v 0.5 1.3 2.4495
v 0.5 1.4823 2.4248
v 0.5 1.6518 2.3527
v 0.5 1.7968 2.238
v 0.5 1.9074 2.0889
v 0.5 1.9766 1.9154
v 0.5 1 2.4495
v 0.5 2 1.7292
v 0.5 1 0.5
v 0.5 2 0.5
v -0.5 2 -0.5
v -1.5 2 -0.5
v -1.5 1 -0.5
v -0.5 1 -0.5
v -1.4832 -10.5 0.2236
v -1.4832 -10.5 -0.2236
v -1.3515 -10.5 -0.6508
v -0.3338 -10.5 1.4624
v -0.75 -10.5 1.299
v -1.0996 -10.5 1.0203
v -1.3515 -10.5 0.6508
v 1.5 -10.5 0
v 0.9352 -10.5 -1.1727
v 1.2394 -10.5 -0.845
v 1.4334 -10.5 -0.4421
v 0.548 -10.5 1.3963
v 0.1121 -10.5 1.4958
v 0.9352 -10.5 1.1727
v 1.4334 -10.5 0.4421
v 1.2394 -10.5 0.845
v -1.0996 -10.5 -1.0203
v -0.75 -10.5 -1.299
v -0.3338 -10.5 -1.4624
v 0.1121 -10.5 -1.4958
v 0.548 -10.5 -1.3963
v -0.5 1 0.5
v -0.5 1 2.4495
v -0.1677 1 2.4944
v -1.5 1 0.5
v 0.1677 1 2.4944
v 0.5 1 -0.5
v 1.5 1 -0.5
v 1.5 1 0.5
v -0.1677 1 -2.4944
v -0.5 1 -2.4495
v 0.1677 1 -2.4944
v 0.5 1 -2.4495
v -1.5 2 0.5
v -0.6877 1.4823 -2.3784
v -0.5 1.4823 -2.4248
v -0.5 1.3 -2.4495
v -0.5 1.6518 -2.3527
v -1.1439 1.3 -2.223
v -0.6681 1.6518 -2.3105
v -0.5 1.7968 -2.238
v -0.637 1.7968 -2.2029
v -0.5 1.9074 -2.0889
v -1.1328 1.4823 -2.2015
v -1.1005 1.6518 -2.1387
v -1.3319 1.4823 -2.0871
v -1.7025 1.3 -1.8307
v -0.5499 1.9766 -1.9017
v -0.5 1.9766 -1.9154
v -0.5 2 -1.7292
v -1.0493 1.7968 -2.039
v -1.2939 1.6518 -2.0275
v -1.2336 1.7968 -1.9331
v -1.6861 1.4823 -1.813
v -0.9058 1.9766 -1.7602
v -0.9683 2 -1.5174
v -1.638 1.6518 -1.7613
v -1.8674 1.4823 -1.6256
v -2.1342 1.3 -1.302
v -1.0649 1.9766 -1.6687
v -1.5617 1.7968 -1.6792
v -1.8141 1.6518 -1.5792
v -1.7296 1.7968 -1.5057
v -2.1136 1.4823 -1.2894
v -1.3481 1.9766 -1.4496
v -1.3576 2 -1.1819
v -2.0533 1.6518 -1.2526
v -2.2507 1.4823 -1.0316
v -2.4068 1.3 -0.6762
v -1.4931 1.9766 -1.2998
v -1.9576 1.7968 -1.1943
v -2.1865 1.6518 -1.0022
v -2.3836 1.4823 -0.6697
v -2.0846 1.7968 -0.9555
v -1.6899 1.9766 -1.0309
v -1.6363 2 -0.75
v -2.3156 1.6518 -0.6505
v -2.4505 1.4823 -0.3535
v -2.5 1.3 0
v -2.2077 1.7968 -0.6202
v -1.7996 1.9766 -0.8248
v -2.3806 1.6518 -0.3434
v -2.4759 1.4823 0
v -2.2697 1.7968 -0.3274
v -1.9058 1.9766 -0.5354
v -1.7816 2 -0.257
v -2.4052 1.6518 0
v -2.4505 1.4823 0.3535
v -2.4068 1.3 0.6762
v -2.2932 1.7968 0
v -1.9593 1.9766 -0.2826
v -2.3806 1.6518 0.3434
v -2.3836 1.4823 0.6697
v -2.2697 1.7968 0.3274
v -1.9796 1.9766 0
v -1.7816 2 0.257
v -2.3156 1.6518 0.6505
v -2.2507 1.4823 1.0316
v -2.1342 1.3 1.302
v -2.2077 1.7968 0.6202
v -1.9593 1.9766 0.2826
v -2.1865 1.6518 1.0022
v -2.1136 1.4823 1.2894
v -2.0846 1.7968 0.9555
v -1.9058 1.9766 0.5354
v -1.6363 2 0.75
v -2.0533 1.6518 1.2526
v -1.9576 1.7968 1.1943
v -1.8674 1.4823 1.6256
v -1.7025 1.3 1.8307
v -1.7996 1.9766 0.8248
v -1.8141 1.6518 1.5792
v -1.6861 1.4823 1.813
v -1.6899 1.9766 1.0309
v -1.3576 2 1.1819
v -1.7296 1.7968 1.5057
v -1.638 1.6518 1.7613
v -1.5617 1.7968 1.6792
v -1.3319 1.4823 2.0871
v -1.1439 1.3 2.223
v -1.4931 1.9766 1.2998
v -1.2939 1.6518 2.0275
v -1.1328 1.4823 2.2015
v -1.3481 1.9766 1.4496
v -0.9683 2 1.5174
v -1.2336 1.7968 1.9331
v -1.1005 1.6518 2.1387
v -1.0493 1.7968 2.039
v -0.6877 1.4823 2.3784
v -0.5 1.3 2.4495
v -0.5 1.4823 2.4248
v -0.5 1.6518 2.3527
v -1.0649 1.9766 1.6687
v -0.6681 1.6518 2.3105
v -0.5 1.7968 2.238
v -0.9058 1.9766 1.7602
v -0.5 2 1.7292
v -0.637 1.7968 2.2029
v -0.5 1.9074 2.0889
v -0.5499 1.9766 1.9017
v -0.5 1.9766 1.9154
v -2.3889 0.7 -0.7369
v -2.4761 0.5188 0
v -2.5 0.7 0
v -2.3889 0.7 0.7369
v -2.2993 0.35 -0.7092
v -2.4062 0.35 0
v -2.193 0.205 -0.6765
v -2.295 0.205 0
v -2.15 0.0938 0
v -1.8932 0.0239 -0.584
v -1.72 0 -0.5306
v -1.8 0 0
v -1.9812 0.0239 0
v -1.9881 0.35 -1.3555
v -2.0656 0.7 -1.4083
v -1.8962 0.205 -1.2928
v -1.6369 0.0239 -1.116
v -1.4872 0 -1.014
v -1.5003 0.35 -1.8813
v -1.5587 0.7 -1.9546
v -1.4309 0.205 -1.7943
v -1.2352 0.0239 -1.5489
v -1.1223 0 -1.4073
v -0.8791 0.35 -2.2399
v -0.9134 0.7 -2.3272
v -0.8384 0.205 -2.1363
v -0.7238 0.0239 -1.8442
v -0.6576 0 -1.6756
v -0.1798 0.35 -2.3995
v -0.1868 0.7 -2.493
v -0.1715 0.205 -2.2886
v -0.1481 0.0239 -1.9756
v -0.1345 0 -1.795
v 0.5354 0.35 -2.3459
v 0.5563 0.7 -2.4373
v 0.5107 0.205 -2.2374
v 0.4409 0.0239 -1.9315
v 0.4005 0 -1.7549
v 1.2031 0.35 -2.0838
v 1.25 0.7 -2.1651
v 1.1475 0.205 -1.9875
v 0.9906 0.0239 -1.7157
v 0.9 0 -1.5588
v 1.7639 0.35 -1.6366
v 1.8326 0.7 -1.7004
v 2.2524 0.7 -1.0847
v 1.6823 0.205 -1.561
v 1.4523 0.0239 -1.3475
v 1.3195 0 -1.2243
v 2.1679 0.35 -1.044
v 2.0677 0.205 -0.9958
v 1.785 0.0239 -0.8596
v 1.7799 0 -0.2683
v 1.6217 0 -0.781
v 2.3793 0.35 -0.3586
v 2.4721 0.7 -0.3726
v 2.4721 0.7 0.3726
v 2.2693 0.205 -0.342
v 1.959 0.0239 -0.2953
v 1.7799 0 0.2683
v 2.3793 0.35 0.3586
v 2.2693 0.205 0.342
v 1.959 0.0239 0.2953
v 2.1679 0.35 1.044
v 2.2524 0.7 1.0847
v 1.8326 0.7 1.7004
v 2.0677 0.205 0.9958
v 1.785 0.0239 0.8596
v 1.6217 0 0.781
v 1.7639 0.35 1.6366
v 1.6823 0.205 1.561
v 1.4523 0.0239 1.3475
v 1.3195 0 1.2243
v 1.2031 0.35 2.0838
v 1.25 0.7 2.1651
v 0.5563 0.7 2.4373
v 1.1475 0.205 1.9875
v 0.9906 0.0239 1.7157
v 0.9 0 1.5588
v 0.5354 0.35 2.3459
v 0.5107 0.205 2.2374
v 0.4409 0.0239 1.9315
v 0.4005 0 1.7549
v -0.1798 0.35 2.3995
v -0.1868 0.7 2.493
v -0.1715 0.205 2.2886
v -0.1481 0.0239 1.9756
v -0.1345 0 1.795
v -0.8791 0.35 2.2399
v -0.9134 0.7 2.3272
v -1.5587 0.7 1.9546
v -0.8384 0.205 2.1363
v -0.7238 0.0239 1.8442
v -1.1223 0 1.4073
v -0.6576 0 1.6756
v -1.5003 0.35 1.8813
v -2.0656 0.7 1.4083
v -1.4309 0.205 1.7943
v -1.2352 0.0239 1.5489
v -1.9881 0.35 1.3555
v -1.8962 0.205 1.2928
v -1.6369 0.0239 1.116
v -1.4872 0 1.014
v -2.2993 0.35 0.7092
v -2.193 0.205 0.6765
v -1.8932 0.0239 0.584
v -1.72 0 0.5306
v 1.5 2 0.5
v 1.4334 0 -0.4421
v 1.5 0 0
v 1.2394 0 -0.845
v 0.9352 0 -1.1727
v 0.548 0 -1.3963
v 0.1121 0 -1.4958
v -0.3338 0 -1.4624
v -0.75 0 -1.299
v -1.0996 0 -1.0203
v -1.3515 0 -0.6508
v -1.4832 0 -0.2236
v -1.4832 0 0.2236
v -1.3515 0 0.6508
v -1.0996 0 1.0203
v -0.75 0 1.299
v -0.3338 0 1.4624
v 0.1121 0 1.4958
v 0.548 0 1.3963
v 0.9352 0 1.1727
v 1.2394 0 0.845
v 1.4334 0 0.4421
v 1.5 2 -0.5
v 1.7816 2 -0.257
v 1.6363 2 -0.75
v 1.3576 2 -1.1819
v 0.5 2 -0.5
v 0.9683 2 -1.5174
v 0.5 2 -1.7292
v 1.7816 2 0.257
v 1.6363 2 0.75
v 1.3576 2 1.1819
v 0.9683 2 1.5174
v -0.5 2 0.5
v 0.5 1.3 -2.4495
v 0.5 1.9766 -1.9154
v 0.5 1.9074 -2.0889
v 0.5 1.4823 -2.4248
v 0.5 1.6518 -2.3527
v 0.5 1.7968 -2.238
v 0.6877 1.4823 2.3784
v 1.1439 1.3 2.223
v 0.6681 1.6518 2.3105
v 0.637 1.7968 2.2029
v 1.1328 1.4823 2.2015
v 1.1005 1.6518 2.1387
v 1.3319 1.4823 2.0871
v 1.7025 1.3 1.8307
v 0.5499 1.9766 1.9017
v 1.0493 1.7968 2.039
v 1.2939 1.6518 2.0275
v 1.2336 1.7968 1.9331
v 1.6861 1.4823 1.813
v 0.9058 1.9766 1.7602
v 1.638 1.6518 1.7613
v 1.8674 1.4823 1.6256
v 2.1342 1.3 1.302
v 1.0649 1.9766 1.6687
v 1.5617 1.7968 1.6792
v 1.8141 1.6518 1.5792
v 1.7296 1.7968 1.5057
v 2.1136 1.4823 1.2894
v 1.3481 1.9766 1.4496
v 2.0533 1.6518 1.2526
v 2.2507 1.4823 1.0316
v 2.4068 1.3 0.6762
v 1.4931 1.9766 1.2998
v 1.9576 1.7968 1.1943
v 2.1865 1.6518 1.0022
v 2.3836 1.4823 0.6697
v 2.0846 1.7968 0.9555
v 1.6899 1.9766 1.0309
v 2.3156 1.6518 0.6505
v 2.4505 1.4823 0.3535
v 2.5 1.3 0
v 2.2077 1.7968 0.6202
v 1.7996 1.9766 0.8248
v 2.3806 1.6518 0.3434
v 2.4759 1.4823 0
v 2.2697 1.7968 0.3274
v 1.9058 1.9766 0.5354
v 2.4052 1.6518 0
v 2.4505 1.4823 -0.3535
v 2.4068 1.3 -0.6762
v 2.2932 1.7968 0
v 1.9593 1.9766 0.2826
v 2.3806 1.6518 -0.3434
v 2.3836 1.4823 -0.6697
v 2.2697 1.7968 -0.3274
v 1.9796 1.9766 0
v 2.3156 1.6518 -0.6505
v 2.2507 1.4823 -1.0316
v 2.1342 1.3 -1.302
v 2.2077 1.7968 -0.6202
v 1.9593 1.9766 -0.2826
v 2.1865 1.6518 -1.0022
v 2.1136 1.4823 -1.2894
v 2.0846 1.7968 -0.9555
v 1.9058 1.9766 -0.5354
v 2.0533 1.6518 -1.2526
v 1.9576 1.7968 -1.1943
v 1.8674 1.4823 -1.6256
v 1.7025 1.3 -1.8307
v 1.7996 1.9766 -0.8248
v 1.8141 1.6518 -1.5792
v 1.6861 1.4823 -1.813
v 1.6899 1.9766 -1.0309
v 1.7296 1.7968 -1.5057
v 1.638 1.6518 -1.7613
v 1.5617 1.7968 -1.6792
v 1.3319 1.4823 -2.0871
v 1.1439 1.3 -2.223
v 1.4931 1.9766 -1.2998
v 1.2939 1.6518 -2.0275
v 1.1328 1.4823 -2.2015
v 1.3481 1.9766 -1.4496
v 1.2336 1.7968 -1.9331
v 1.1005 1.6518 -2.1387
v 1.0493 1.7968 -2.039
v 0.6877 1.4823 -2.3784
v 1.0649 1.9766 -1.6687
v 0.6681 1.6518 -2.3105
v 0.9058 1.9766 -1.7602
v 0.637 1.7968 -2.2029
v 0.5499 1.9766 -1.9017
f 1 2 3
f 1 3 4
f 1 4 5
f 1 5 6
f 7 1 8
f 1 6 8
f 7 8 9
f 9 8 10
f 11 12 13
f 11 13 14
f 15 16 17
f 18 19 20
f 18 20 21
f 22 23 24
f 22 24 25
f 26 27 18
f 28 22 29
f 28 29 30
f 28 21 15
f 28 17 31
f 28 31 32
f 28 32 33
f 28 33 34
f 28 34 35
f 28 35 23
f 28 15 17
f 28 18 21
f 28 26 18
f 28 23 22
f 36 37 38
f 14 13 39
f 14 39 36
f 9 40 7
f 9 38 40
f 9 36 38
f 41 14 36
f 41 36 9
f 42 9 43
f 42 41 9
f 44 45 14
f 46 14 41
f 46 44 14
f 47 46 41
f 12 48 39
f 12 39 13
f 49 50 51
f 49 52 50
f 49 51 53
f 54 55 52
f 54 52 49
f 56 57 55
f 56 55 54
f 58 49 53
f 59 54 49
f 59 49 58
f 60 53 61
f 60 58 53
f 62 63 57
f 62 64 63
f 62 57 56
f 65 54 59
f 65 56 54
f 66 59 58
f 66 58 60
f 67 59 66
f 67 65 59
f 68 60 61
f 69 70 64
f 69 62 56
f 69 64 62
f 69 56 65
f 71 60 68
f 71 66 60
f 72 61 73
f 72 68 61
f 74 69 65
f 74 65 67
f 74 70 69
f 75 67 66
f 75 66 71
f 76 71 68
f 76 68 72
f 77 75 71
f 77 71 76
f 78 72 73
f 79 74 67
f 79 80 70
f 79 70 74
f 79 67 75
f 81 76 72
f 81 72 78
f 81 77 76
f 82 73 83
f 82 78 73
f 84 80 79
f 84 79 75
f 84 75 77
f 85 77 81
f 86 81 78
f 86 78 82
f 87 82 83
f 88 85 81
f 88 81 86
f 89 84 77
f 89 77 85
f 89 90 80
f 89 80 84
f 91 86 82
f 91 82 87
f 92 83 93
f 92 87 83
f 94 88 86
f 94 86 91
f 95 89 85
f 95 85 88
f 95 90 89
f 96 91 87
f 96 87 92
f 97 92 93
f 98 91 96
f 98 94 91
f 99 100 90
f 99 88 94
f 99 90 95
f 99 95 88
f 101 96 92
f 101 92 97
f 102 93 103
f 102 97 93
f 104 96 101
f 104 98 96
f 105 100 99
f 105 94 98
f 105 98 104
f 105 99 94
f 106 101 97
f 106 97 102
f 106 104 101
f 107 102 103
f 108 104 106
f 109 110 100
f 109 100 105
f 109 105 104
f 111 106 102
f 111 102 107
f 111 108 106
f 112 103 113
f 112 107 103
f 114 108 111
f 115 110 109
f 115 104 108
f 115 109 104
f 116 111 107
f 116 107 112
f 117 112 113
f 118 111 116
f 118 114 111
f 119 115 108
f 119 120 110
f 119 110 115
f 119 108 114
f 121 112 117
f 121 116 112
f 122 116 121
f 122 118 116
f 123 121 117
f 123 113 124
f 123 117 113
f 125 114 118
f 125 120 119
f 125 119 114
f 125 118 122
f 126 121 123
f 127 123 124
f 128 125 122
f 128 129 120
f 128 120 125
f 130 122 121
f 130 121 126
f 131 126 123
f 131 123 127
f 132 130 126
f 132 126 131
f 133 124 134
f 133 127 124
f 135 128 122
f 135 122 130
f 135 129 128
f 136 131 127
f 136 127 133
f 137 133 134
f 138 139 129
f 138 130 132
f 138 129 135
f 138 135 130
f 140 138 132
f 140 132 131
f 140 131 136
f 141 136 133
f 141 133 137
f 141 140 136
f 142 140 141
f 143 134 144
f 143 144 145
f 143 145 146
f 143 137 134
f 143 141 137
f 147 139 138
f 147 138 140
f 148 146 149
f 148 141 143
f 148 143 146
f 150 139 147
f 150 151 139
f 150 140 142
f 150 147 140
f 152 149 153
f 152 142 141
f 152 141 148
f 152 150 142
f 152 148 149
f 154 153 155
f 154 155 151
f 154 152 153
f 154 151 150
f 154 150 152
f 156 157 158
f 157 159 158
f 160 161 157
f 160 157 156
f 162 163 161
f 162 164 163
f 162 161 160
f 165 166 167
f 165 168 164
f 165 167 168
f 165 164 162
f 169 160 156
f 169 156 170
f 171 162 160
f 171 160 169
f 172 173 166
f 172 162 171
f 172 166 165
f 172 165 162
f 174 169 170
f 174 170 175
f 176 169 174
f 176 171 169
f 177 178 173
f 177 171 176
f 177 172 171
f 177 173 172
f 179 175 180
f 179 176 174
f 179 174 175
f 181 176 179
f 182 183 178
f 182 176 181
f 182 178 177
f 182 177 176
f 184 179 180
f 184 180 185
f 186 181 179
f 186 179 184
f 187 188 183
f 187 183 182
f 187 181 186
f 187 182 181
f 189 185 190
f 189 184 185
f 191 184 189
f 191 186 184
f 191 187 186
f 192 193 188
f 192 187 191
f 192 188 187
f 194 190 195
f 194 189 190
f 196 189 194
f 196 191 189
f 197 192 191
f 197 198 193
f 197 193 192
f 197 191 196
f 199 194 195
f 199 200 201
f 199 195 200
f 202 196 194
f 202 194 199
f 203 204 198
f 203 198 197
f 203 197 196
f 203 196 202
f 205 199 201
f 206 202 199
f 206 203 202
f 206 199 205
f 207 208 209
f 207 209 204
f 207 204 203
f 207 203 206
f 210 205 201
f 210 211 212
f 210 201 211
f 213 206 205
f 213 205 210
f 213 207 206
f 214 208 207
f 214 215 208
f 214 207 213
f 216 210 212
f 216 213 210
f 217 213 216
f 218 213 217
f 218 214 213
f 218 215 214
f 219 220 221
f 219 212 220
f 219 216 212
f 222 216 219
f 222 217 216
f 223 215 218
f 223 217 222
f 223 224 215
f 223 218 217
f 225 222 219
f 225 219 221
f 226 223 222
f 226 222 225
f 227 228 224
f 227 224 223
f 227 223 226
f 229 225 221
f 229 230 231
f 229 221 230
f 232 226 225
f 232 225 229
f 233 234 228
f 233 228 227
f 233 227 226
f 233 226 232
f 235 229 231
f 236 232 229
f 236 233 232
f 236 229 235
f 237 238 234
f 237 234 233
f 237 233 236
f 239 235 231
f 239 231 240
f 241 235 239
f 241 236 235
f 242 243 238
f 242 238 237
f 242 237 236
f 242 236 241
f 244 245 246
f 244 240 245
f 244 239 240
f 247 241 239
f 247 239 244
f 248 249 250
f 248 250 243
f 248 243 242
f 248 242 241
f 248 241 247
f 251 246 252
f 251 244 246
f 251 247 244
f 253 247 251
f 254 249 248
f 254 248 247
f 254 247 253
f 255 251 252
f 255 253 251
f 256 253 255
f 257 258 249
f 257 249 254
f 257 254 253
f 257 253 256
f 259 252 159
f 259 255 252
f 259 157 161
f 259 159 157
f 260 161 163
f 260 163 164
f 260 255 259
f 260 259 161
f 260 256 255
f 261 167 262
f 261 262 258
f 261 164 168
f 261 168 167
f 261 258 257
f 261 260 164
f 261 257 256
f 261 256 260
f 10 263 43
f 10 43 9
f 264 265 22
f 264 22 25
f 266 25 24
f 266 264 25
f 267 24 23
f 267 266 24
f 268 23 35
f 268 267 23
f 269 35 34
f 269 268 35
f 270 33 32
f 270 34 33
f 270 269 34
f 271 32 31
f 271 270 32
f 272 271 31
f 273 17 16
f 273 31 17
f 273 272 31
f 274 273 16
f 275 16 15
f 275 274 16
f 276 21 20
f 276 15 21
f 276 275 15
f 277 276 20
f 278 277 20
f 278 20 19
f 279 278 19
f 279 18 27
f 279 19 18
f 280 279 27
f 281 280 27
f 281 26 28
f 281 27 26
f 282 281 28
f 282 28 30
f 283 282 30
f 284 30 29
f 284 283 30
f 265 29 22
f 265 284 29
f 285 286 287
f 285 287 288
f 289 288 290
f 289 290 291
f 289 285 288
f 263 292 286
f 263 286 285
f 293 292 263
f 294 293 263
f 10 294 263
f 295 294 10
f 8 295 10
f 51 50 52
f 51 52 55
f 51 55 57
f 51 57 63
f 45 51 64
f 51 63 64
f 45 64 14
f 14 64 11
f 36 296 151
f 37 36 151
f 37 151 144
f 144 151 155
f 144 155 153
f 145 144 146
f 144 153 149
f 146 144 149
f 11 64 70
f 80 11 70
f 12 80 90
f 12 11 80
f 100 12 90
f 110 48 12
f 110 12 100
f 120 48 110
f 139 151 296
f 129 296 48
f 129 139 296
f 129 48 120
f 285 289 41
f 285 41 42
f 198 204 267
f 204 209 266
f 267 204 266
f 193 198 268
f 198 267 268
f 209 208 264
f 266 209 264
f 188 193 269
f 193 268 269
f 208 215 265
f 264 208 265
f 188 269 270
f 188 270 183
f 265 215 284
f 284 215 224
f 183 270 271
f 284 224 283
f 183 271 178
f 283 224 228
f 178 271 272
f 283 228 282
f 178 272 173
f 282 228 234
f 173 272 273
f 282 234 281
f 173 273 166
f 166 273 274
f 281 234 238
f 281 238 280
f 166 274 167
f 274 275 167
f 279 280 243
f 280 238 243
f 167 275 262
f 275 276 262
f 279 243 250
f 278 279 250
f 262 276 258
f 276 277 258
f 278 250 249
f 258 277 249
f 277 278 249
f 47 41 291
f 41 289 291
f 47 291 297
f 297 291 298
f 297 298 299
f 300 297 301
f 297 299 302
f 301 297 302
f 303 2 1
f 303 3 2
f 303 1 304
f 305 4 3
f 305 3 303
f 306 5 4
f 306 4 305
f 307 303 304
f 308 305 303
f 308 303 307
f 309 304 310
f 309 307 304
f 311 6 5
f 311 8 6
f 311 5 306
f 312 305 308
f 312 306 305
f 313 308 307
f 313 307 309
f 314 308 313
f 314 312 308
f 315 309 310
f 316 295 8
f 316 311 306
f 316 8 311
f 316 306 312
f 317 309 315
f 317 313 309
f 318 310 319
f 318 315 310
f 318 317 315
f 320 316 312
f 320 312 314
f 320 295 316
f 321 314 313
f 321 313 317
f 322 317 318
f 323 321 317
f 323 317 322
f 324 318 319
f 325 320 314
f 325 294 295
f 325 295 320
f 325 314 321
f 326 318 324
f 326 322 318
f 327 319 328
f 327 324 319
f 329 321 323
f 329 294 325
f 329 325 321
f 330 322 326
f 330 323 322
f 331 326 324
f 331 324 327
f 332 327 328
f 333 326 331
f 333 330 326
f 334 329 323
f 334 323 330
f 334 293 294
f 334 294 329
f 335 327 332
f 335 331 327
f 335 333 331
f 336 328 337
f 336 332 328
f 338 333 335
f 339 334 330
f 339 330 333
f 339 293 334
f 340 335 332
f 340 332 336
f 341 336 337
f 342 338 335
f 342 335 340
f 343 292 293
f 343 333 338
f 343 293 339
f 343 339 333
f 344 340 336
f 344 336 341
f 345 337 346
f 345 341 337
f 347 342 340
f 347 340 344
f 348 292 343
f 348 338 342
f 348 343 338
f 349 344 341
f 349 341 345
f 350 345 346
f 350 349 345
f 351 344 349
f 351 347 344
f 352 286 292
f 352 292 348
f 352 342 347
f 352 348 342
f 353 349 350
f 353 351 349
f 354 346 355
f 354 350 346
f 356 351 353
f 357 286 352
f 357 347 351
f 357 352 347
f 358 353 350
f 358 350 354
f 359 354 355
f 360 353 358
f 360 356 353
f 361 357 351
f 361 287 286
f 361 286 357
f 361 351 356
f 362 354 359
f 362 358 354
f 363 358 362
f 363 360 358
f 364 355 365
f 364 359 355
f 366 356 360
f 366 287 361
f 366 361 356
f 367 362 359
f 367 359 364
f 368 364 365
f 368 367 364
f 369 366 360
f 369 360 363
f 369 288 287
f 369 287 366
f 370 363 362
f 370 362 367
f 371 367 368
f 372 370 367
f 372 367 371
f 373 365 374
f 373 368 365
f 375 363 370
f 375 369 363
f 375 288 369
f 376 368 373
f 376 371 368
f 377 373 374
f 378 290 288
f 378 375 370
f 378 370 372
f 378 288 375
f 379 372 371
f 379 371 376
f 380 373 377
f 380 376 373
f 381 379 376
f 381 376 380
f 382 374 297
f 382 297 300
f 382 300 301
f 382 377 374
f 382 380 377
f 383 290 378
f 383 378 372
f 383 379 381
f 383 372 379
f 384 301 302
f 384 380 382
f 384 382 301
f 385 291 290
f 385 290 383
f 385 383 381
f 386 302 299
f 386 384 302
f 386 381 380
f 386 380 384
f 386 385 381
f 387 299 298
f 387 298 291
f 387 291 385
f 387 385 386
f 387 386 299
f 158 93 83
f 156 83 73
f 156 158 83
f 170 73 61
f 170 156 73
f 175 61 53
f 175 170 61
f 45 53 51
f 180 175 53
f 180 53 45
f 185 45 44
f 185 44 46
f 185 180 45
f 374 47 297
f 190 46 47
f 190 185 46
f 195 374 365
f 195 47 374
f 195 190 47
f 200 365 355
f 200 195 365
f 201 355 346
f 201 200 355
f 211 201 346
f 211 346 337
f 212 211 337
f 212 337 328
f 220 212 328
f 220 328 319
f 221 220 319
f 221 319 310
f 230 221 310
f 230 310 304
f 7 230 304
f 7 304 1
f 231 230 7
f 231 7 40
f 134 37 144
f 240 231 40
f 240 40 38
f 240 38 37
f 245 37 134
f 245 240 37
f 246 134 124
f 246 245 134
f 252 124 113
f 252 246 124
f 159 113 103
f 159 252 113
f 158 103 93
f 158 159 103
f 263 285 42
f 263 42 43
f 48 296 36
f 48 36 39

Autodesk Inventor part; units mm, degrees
ref_plane "YZ Plane" through (0, 0, 0) normal (1, 0, 0) x (0, 1, 0)
ref_plane "XZ Plane" through (0, 0, 0) normal (0, 1, 0) x (-1, 0, 0)
ref_plane "XY Plane" through (0, 0, 0) normal (0, 0, 1) x (1, 0, 0)
sketch "Skizze1" plane through (0, 0, 0) normal (0, 1, 0) x (-1, 0, 0)
  circle A0 centre (0, 0) radius 2.5
  dimension "d0" = 5
extrude "Extrusion1" add sketch "Skizze1" along normal blind 2
sketch "Skizze2" plane through (0, 2, 0) normal (0, 1, 0) x (1, 0, 0)
  line L0 (-0.5, -3.2562) -> (0.5, -3.2562)
  line L1 (0.5, -3.2562) -> (0.5, 3.274)
  line L2 (0.5, 3.274) -> (-0.5, 3.274)
  line L3 (-0.5, 3.274) -> (-0.5, -3.2562)
  line L4 (1.5, -0.5) -> (-1.5, -0.5)
  line L5 (-1.5, -0.5) -> (-1.5, 0.5)
  line L6 (-1.5, 0.5) -> (1.5, 0.5)
  line L7 (1.5, 0.5) -> (1.5, -0.5)
  point P0 (0, 0)
  dimension "d3" = 1
  dimension "d4" = 1
  dimension "d5" = 0.5
  dimension "d6" = 0.5
  dimension "d7" = 3
  dimension "d8" = 1.5
fillet "Rundung1" radius 0.7 2 edges at (2.5, 2, 0) (2.5, 0, 0)
extrude "Extrusion2" cut sketch "Skizze2" against normal blind 1
sketch "Skizze3" plane through (0, 0, 0) normal (0, -1, 0) x (1, 0, 0)
  circle A0 centre (0, 0) radius 1.5
  dimension "d12" = 3
extrude "Extrusion3" add sketch "Skizze3" along normal blind 10.5
properties part number "Schraube"
